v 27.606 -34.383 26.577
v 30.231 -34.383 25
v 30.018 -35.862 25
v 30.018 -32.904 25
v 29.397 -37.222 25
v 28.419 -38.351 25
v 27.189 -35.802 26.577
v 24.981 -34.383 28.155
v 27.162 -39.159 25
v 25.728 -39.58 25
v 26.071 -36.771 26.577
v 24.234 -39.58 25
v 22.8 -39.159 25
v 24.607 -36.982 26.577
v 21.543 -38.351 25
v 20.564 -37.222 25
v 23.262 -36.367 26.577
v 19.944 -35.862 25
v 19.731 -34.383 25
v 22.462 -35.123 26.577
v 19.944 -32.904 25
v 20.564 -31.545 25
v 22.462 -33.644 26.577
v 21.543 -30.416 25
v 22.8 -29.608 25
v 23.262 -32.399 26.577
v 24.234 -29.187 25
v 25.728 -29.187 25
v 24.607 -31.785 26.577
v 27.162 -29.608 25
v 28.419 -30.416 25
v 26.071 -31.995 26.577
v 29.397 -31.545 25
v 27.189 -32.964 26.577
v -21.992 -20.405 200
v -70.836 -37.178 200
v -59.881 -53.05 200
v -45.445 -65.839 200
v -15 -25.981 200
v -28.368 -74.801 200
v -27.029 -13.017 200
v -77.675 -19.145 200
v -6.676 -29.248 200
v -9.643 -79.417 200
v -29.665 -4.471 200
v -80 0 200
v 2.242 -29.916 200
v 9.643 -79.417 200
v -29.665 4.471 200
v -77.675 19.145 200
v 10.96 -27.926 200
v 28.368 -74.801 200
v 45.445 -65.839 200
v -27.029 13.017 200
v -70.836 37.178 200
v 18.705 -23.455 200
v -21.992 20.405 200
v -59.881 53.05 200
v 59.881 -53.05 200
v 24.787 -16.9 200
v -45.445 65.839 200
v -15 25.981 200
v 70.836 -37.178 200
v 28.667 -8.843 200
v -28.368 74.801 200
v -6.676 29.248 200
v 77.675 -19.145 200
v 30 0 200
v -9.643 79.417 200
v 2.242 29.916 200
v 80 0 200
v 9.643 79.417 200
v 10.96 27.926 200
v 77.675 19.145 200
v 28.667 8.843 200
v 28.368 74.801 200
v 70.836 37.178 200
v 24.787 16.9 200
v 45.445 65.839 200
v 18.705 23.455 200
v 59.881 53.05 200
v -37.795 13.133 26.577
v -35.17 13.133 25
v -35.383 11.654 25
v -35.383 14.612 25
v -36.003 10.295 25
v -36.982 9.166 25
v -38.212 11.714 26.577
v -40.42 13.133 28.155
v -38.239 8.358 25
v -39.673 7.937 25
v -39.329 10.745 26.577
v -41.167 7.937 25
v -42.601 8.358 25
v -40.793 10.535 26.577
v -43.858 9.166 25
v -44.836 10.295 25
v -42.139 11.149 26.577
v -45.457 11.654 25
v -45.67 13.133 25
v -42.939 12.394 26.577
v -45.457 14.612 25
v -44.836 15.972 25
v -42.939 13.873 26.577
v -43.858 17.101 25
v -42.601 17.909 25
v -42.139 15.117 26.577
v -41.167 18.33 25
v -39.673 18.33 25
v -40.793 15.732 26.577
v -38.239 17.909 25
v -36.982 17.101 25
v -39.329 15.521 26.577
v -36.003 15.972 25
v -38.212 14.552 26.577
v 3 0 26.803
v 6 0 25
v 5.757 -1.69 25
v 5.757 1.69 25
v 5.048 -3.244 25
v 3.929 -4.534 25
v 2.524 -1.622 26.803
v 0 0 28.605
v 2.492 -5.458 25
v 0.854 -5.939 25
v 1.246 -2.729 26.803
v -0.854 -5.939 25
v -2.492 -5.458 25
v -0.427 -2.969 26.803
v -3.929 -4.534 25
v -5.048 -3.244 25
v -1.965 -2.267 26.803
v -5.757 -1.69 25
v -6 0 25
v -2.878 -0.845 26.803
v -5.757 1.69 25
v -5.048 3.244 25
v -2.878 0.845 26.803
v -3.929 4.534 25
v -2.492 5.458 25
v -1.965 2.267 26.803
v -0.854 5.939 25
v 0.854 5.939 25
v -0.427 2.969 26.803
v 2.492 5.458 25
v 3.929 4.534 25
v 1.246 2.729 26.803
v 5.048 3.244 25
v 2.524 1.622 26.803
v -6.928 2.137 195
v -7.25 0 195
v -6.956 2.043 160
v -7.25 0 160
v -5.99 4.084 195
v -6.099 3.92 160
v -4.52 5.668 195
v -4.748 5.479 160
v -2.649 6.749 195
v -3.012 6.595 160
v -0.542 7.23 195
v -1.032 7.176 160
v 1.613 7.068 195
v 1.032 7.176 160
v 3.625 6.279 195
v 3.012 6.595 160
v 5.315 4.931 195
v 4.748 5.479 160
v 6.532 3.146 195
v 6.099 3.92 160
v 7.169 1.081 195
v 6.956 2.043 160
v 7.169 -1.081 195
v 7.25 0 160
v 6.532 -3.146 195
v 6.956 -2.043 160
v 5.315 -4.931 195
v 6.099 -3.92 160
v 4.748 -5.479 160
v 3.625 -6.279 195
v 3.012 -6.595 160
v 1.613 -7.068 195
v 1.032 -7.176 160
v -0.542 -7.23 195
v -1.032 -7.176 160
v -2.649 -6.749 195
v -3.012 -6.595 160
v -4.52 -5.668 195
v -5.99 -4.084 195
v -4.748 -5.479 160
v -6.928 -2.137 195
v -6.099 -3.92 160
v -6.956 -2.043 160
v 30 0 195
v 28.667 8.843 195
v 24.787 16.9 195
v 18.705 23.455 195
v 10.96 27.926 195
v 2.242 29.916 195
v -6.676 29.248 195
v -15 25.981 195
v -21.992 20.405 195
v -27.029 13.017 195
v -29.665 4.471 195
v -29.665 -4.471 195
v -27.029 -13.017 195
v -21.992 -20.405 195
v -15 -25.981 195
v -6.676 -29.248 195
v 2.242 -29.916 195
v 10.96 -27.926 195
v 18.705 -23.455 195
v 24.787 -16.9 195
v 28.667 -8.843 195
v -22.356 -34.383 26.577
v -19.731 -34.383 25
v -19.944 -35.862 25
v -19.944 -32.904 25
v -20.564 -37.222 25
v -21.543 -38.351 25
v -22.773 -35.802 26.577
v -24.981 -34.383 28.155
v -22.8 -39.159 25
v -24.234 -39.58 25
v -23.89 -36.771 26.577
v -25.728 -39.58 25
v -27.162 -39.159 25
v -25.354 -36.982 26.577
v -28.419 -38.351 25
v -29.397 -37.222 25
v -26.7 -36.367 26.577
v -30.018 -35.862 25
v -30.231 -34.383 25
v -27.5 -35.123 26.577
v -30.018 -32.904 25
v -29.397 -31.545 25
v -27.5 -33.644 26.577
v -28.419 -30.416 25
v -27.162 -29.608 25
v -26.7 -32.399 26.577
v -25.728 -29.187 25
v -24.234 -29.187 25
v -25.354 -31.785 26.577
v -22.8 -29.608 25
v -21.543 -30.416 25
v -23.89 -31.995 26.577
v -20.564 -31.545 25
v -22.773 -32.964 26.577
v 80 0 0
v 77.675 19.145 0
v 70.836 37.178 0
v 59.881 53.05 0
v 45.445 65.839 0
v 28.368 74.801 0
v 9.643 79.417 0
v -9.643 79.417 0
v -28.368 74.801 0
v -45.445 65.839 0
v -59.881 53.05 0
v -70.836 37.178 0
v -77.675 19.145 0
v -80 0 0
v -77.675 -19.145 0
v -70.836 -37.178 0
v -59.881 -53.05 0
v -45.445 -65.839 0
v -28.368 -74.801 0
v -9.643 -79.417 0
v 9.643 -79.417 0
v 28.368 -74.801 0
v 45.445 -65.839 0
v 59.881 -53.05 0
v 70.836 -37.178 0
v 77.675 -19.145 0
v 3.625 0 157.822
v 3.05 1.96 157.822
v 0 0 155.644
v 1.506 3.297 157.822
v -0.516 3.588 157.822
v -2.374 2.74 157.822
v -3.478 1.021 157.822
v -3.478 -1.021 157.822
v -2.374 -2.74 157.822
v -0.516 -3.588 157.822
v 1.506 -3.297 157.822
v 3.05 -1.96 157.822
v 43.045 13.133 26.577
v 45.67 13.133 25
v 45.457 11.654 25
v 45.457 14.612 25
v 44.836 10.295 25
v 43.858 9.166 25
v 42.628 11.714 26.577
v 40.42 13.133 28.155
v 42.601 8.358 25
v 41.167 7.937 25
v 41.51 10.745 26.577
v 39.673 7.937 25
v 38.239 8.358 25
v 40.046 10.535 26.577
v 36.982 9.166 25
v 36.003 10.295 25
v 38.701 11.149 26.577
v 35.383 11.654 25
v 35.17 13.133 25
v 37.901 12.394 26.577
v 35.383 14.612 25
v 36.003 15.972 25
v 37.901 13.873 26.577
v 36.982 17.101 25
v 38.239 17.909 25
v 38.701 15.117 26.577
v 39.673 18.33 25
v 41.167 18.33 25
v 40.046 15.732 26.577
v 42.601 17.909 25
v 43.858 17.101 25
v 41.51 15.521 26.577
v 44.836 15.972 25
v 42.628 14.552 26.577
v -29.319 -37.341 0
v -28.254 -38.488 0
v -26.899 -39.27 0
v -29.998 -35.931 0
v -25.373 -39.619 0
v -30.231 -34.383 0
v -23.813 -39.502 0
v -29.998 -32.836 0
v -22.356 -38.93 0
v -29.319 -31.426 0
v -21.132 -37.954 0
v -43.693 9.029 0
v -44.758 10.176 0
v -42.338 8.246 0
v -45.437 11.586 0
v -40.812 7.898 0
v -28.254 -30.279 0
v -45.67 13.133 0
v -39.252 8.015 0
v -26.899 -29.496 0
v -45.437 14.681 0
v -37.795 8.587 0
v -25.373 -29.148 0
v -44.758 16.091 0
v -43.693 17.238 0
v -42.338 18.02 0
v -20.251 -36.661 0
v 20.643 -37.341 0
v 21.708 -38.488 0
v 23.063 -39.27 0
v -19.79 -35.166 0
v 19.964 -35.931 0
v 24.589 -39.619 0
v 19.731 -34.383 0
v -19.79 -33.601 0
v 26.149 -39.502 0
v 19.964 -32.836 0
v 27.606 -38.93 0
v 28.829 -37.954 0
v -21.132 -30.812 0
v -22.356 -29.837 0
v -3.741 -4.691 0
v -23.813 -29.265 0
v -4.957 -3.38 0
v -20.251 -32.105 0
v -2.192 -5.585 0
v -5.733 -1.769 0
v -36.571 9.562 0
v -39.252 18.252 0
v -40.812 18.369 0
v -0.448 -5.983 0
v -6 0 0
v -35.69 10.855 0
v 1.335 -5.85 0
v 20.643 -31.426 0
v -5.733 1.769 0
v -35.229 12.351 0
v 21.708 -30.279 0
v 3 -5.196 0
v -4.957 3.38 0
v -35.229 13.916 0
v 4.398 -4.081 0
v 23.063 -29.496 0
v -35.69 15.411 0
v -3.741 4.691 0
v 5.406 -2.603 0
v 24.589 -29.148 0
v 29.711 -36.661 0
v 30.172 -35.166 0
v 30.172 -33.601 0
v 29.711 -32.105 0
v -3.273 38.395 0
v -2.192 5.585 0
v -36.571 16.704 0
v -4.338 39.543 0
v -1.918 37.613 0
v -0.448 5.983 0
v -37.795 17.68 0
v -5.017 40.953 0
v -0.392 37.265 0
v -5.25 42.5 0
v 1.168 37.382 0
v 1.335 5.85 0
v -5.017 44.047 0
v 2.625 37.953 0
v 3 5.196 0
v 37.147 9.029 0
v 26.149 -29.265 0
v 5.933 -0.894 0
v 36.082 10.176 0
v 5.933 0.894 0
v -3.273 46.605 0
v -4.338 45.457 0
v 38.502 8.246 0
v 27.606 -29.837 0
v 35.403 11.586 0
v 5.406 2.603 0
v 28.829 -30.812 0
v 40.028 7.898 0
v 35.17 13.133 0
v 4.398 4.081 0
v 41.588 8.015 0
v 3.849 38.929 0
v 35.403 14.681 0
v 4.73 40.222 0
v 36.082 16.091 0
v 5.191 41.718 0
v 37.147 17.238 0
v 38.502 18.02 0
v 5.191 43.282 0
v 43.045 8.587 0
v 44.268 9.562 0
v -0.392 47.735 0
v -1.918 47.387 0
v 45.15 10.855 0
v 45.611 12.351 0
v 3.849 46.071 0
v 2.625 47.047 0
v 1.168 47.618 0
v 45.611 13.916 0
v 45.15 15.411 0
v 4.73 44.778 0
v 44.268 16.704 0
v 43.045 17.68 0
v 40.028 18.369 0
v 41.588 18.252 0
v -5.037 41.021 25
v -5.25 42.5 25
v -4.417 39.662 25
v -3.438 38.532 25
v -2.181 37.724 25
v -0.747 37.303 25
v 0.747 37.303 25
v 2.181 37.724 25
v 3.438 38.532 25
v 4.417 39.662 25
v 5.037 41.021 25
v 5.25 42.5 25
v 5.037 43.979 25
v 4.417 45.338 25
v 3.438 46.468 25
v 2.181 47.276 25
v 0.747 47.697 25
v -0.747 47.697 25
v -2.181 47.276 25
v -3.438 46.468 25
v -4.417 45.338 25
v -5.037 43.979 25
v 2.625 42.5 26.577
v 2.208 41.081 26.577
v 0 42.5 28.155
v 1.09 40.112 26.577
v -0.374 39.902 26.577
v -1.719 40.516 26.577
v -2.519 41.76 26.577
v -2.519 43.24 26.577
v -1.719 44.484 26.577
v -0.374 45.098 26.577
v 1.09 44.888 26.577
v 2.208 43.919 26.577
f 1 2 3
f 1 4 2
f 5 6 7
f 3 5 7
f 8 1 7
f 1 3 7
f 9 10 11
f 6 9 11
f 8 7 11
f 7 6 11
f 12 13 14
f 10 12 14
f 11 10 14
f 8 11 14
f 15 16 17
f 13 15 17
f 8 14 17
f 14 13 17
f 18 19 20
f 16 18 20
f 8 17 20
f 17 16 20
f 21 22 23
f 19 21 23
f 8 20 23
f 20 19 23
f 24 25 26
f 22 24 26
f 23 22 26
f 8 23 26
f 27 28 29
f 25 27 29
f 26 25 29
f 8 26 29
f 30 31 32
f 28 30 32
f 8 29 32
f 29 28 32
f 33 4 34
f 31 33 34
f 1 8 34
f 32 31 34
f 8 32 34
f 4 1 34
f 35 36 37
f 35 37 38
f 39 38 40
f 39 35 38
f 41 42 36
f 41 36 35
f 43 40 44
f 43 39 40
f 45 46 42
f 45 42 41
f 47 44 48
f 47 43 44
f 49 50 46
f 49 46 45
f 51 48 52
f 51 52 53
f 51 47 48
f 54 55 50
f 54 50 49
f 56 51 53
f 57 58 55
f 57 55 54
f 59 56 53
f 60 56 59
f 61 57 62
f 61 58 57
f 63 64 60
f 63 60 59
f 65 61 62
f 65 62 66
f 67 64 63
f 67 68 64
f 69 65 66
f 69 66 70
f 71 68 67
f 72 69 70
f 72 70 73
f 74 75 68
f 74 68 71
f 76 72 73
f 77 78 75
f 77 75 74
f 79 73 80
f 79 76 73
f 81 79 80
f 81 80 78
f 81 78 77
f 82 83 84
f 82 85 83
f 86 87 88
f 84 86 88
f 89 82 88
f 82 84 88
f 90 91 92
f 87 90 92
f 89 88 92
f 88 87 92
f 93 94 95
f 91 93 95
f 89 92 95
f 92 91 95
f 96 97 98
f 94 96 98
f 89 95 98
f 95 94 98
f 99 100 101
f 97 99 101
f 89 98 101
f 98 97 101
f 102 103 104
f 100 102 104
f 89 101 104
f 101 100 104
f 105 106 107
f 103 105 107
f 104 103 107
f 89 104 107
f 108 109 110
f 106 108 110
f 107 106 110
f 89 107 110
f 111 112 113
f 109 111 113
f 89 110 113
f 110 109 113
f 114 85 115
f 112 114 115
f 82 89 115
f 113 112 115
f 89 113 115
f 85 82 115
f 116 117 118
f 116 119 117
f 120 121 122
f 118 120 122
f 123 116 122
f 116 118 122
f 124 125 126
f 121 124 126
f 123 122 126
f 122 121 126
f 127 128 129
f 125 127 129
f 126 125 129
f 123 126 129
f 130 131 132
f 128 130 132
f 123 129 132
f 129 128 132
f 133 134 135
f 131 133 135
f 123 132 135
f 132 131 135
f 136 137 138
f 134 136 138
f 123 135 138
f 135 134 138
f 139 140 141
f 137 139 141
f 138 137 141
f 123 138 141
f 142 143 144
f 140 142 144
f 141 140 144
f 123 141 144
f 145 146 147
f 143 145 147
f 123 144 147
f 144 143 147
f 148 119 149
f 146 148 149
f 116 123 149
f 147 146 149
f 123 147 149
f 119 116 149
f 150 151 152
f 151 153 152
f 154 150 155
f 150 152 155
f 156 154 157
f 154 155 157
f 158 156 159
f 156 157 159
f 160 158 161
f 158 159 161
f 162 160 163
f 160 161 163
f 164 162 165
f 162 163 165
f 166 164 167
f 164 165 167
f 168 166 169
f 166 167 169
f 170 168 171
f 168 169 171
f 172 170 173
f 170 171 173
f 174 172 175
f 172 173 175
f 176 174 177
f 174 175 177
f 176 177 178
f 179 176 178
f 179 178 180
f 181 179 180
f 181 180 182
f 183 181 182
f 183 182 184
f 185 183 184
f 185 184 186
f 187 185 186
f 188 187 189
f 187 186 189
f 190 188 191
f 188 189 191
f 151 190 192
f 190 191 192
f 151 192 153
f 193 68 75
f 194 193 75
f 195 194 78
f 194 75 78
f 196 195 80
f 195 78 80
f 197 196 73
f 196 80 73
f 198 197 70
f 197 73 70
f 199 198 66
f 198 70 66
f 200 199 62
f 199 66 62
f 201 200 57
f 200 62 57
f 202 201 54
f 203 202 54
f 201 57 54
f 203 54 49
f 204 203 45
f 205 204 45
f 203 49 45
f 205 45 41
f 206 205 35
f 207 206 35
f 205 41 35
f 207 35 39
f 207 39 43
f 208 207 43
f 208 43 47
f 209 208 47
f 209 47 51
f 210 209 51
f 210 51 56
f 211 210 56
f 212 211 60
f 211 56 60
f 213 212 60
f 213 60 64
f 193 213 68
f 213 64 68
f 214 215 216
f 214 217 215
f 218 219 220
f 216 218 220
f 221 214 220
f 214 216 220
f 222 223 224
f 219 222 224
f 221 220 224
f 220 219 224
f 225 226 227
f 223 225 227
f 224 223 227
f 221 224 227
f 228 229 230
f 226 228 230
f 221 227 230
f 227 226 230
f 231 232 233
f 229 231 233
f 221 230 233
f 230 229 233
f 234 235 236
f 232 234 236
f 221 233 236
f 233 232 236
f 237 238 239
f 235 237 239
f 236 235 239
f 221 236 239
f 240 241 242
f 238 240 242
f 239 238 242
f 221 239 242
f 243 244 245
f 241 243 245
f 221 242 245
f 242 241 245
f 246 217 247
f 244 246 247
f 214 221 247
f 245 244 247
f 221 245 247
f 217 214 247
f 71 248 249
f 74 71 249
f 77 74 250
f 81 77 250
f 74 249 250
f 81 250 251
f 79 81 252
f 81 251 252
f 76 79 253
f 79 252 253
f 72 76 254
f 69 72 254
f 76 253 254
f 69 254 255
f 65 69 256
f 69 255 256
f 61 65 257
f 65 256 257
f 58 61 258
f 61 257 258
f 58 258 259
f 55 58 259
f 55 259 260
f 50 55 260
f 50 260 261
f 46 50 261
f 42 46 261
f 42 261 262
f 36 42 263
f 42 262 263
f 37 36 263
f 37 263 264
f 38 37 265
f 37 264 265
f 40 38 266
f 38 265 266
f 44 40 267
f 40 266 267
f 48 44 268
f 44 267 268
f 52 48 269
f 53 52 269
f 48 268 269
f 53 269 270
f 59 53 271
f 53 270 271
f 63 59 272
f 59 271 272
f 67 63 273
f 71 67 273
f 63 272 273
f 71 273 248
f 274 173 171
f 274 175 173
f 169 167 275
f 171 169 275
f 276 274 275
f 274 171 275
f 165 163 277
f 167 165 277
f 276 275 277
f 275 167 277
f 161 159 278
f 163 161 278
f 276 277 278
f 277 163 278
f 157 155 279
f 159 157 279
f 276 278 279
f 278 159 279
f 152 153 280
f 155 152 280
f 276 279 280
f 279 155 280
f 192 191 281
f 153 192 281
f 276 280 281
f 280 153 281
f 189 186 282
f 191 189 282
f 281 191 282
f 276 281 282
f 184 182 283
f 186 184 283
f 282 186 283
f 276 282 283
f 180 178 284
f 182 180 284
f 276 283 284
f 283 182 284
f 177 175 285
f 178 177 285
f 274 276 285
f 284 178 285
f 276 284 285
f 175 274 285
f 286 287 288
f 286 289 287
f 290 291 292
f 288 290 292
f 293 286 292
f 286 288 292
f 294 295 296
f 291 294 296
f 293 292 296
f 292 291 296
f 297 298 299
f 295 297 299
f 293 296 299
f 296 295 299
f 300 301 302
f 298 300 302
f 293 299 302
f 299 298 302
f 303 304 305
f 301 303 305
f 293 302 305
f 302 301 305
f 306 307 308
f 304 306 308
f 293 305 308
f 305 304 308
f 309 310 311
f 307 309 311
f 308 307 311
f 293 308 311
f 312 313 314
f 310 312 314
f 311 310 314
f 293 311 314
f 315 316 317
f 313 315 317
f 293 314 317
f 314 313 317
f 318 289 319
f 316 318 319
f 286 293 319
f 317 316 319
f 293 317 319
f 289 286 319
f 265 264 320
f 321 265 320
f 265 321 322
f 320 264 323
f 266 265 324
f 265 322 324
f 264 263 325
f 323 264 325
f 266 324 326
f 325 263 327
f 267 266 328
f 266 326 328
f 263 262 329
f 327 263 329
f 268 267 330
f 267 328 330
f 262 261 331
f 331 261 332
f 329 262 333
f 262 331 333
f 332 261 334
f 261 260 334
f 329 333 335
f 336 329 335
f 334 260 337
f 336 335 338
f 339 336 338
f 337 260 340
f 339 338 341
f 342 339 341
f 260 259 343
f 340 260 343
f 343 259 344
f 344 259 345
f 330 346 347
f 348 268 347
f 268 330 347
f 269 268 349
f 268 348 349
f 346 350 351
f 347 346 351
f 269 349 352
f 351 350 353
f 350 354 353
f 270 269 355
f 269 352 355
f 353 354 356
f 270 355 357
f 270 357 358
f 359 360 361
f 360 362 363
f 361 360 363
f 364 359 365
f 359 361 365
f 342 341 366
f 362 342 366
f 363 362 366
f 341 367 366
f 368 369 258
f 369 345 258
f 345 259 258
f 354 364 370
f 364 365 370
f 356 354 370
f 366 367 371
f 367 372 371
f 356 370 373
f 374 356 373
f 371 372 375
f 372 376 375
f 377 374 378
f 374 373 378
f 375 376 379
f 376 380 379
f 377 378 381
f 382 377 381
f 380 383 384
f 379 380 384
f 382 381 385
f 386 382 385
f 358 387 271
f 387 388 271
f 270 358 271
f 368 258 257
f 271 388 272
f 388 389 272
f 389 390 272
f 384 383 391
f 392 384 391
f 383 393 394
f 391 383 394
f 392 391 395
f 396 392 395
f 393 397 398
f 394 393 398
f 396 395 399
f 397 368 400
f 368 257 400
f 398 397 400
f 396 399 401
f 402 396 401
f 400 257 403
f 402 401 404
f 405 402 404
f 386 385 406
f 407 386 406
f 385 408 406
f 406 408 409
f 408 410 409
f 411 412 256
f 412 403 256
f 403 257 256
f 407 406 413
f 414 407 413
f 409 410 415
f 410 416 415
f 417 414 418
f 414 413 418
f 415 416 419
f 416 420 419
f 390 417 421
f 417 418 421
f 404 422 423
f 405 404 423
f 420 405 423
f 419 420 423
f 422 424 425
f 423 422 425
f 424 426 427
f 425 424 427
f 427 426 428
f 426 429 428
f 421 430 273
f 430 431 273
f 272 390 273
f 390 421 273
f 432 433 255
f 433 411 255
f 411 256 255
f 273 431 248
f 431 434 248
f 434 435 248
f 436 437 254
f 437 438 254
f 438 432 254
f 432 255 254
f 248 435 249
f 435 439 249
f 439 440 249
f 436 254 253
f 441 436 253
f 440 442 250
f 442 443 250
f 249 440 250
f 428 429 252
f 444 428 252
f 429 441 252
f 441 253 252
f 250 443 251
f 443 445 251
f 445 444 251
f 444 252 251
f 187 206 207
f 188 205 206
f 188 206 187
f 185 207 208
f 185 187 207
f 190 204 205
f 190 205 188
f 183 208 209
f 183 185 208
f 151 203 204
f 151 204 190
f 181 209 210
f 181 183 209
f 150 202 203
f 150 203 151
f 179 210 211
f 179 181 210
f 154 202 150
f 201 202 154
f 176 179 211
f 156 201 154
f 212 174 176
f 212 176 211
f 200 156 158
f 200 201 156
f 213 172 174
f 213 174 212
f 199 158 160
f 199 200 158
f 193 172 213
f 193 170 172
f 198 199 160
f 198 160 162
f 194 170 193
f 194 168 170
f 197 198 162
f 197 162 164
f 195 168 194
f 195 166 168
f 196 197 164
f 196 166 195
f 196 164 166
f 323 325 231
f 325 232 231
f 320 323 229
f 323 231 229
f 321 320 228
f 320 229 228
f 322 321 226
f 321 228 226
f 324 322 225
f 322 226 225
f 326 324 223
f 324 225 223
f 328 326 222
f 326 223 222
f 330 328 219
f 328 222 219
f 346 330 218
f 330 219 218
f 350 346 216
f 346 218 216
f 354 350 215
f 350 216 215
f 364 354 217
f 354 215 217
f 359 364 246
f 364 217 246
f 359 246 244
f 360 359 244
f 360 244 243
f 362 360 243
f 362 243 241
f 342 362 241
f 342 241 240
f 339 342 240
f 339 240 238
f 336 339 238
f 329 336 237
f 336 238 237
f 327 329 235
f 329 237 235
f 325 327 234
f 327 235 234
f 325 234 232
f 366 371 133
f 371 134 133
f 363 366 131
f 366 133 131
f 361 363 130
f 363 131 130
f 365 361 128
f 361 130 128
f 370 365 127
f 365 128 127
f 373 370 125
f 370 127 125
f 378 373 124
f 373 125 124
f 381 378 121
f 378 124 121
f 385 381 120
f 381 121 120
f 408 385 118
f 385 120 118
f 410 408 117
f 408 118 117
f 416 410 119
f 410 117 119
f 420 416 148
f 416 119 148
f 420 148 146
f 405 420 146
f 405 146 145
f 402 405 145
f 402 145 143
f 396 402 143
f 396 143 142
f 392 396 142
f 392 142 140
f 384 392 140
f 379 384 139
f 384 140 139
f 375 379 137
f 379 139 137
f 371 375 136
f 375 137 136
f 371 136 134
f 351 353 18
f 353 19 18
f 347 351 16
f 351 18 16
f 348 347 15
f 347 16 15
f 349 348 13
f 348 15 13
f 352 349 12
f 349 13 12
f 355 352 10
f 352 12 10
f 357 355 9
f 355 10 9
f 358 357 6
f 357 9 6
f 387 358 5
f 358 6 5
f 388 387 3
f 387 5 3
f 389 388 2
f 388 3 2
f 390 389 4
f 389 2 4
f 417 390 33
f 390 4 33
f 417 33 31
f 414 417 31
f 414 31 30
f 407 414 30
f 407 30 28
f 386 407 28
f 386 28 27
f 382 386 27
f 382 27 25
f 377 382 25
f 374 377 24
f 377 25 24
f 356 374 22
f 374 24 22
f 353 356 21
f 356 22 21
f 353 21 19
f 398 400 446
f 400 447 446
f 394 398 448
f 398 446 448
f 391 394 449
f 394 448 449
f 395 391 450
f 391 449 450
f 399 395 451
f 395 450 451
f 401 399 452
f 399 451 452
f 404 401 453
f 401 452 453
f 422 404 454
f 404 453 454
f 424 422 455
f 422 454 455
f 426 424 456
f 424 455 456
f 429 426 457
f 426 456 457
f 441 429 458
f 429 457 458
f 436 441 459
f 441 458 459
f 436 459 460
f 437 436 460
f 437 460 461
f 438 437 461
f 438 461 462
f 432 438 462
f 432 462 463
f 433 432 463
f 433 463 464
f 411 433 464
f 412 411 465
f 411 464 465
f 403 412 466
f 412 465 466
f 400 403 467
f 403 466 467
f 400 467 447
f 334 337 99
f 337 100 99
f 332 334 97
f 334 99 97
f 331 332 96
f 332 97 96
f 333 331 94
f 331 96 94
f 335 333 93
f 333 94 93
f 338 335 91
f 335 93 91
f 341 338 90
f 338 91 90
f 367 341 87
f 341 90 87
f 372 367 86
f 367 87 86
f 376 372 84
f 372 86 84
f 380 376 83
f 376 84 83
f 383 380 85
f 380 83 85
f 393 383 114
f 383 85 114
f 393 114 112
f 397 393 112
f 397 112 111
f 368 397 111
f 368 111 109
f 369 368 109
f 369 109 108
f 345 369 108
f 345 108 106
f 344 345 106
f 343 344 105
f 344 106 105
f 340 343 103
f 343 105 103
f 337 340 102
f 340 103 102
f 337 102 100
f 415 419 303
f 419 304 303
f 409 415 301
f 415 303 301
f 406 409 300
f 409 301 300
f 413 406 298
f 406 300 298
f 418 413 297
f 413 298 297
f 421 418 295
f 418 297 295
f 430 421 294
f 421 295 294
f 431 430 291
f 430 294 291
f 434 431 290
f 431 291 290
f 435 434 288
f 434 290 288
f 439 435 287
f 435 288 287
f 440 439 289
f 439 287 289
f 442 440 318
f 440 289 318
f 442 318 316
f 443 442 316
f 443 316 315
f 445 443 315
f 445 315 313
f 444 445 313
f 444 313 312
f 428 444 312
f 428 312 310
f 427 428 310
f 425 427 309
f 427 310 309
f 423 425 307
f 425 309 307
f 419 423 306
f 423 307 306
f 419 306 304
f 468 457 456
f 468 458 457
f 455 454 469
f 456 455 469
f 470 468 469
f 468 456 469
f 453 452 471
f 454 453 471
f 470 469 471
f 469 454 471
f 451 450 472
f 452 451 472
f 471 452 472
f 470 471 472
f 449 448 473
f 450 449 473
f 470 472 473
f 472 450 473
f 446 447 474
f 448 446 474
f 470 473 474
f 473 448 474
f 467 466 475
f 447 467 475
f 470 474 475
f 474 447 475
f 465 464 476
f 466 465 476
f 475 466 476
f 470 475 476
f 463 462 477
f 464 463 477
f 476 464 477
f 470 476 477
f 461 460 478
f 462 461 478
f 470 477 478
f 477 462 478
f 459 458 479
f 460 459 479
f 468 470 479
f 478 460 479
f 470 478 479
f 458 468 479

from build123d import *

# Parameters (mm, degrees)
F0_R     = 80
F1_DEPTH = 200
F3_D     = 14.5
F3_DEPTH = 40
F3_TIP   = 4.3562394879
F2_R     = 30
F2_R_2   = 20
F4_DEPTH = 5
F6_D     = 10.5
F6_DEPTH = 25
F6_TIP   = 3.1545182499
F7_D     = 12
F7_DEPTH = 25
F7_TIP   = 3.6051637142


with BuildPart() as f1:
    # F0 (on Top) → F1 (new body)
    with BuildSketch(Plane.XY):
        Circle(F0_R)
    extrude(amount=F1_DEPTH)

    # F3
    with Locations(Plane.XY.offset(200)):
        with Locations((0, 0)):
            Hole(F3_D / 2, depth=F3_DEPTH)
            with Locations((0, 0, -(F3_DEPTH + F3_TIP / 2))):  # 118° drill point
                Cone(0, F3_D / 2, F3_TIP, mode=Mode.SUBTRACT)

    # F2 (on face) → F4 (cut)
    with BuildSketch(Plane.XY.offset(200)):
        Circle(F2_R)
        Circle(F2_R_2, mode=Mode.SUBTRACT)
        Circle(F2_R_2)
    extrude(amount=-F4_DEPTH, mode=Mode.SUBTRACT)

    # F6
    with Locations(Plane(origin=(0, 0, 0), x_dir=(1, 0, 0), z_dir=(0, 0, -1))):
        with Locations((-24.9808732224, 34.3832222609), (-40.4199019425, -13.1332222609), (0, -42.5), (40.4199019425, -13.1332222609), (24.9808732224, 34.3832222609)):
            Hole(F6_D / 2, depth=F6_DEPTH)
            with Locations((0, 0, -(F6_DEPTH + F6_TIP / 2))):  # 118° drill point
                Cone(0, F6_D / 2, F6_TIP, mode=Mode.SUBTRACT)

    # F7
    with Locations(Plane(origin=(0, 0, 0), x_dir=(1, 0, 0), z_dir=(0, 0, -1))):
        with Locations((0, 0)):
            Hole(F7_D / 2, depth=F7_DEPTH)
            with Locations((0, 0, -(F7_DEPTH + F7_TIP / 2))):  # 118° drill point
                Cone(0, F7_D / 2, F7_TIP, mode=Mode.SUBTRACT)


solid = f1.part
